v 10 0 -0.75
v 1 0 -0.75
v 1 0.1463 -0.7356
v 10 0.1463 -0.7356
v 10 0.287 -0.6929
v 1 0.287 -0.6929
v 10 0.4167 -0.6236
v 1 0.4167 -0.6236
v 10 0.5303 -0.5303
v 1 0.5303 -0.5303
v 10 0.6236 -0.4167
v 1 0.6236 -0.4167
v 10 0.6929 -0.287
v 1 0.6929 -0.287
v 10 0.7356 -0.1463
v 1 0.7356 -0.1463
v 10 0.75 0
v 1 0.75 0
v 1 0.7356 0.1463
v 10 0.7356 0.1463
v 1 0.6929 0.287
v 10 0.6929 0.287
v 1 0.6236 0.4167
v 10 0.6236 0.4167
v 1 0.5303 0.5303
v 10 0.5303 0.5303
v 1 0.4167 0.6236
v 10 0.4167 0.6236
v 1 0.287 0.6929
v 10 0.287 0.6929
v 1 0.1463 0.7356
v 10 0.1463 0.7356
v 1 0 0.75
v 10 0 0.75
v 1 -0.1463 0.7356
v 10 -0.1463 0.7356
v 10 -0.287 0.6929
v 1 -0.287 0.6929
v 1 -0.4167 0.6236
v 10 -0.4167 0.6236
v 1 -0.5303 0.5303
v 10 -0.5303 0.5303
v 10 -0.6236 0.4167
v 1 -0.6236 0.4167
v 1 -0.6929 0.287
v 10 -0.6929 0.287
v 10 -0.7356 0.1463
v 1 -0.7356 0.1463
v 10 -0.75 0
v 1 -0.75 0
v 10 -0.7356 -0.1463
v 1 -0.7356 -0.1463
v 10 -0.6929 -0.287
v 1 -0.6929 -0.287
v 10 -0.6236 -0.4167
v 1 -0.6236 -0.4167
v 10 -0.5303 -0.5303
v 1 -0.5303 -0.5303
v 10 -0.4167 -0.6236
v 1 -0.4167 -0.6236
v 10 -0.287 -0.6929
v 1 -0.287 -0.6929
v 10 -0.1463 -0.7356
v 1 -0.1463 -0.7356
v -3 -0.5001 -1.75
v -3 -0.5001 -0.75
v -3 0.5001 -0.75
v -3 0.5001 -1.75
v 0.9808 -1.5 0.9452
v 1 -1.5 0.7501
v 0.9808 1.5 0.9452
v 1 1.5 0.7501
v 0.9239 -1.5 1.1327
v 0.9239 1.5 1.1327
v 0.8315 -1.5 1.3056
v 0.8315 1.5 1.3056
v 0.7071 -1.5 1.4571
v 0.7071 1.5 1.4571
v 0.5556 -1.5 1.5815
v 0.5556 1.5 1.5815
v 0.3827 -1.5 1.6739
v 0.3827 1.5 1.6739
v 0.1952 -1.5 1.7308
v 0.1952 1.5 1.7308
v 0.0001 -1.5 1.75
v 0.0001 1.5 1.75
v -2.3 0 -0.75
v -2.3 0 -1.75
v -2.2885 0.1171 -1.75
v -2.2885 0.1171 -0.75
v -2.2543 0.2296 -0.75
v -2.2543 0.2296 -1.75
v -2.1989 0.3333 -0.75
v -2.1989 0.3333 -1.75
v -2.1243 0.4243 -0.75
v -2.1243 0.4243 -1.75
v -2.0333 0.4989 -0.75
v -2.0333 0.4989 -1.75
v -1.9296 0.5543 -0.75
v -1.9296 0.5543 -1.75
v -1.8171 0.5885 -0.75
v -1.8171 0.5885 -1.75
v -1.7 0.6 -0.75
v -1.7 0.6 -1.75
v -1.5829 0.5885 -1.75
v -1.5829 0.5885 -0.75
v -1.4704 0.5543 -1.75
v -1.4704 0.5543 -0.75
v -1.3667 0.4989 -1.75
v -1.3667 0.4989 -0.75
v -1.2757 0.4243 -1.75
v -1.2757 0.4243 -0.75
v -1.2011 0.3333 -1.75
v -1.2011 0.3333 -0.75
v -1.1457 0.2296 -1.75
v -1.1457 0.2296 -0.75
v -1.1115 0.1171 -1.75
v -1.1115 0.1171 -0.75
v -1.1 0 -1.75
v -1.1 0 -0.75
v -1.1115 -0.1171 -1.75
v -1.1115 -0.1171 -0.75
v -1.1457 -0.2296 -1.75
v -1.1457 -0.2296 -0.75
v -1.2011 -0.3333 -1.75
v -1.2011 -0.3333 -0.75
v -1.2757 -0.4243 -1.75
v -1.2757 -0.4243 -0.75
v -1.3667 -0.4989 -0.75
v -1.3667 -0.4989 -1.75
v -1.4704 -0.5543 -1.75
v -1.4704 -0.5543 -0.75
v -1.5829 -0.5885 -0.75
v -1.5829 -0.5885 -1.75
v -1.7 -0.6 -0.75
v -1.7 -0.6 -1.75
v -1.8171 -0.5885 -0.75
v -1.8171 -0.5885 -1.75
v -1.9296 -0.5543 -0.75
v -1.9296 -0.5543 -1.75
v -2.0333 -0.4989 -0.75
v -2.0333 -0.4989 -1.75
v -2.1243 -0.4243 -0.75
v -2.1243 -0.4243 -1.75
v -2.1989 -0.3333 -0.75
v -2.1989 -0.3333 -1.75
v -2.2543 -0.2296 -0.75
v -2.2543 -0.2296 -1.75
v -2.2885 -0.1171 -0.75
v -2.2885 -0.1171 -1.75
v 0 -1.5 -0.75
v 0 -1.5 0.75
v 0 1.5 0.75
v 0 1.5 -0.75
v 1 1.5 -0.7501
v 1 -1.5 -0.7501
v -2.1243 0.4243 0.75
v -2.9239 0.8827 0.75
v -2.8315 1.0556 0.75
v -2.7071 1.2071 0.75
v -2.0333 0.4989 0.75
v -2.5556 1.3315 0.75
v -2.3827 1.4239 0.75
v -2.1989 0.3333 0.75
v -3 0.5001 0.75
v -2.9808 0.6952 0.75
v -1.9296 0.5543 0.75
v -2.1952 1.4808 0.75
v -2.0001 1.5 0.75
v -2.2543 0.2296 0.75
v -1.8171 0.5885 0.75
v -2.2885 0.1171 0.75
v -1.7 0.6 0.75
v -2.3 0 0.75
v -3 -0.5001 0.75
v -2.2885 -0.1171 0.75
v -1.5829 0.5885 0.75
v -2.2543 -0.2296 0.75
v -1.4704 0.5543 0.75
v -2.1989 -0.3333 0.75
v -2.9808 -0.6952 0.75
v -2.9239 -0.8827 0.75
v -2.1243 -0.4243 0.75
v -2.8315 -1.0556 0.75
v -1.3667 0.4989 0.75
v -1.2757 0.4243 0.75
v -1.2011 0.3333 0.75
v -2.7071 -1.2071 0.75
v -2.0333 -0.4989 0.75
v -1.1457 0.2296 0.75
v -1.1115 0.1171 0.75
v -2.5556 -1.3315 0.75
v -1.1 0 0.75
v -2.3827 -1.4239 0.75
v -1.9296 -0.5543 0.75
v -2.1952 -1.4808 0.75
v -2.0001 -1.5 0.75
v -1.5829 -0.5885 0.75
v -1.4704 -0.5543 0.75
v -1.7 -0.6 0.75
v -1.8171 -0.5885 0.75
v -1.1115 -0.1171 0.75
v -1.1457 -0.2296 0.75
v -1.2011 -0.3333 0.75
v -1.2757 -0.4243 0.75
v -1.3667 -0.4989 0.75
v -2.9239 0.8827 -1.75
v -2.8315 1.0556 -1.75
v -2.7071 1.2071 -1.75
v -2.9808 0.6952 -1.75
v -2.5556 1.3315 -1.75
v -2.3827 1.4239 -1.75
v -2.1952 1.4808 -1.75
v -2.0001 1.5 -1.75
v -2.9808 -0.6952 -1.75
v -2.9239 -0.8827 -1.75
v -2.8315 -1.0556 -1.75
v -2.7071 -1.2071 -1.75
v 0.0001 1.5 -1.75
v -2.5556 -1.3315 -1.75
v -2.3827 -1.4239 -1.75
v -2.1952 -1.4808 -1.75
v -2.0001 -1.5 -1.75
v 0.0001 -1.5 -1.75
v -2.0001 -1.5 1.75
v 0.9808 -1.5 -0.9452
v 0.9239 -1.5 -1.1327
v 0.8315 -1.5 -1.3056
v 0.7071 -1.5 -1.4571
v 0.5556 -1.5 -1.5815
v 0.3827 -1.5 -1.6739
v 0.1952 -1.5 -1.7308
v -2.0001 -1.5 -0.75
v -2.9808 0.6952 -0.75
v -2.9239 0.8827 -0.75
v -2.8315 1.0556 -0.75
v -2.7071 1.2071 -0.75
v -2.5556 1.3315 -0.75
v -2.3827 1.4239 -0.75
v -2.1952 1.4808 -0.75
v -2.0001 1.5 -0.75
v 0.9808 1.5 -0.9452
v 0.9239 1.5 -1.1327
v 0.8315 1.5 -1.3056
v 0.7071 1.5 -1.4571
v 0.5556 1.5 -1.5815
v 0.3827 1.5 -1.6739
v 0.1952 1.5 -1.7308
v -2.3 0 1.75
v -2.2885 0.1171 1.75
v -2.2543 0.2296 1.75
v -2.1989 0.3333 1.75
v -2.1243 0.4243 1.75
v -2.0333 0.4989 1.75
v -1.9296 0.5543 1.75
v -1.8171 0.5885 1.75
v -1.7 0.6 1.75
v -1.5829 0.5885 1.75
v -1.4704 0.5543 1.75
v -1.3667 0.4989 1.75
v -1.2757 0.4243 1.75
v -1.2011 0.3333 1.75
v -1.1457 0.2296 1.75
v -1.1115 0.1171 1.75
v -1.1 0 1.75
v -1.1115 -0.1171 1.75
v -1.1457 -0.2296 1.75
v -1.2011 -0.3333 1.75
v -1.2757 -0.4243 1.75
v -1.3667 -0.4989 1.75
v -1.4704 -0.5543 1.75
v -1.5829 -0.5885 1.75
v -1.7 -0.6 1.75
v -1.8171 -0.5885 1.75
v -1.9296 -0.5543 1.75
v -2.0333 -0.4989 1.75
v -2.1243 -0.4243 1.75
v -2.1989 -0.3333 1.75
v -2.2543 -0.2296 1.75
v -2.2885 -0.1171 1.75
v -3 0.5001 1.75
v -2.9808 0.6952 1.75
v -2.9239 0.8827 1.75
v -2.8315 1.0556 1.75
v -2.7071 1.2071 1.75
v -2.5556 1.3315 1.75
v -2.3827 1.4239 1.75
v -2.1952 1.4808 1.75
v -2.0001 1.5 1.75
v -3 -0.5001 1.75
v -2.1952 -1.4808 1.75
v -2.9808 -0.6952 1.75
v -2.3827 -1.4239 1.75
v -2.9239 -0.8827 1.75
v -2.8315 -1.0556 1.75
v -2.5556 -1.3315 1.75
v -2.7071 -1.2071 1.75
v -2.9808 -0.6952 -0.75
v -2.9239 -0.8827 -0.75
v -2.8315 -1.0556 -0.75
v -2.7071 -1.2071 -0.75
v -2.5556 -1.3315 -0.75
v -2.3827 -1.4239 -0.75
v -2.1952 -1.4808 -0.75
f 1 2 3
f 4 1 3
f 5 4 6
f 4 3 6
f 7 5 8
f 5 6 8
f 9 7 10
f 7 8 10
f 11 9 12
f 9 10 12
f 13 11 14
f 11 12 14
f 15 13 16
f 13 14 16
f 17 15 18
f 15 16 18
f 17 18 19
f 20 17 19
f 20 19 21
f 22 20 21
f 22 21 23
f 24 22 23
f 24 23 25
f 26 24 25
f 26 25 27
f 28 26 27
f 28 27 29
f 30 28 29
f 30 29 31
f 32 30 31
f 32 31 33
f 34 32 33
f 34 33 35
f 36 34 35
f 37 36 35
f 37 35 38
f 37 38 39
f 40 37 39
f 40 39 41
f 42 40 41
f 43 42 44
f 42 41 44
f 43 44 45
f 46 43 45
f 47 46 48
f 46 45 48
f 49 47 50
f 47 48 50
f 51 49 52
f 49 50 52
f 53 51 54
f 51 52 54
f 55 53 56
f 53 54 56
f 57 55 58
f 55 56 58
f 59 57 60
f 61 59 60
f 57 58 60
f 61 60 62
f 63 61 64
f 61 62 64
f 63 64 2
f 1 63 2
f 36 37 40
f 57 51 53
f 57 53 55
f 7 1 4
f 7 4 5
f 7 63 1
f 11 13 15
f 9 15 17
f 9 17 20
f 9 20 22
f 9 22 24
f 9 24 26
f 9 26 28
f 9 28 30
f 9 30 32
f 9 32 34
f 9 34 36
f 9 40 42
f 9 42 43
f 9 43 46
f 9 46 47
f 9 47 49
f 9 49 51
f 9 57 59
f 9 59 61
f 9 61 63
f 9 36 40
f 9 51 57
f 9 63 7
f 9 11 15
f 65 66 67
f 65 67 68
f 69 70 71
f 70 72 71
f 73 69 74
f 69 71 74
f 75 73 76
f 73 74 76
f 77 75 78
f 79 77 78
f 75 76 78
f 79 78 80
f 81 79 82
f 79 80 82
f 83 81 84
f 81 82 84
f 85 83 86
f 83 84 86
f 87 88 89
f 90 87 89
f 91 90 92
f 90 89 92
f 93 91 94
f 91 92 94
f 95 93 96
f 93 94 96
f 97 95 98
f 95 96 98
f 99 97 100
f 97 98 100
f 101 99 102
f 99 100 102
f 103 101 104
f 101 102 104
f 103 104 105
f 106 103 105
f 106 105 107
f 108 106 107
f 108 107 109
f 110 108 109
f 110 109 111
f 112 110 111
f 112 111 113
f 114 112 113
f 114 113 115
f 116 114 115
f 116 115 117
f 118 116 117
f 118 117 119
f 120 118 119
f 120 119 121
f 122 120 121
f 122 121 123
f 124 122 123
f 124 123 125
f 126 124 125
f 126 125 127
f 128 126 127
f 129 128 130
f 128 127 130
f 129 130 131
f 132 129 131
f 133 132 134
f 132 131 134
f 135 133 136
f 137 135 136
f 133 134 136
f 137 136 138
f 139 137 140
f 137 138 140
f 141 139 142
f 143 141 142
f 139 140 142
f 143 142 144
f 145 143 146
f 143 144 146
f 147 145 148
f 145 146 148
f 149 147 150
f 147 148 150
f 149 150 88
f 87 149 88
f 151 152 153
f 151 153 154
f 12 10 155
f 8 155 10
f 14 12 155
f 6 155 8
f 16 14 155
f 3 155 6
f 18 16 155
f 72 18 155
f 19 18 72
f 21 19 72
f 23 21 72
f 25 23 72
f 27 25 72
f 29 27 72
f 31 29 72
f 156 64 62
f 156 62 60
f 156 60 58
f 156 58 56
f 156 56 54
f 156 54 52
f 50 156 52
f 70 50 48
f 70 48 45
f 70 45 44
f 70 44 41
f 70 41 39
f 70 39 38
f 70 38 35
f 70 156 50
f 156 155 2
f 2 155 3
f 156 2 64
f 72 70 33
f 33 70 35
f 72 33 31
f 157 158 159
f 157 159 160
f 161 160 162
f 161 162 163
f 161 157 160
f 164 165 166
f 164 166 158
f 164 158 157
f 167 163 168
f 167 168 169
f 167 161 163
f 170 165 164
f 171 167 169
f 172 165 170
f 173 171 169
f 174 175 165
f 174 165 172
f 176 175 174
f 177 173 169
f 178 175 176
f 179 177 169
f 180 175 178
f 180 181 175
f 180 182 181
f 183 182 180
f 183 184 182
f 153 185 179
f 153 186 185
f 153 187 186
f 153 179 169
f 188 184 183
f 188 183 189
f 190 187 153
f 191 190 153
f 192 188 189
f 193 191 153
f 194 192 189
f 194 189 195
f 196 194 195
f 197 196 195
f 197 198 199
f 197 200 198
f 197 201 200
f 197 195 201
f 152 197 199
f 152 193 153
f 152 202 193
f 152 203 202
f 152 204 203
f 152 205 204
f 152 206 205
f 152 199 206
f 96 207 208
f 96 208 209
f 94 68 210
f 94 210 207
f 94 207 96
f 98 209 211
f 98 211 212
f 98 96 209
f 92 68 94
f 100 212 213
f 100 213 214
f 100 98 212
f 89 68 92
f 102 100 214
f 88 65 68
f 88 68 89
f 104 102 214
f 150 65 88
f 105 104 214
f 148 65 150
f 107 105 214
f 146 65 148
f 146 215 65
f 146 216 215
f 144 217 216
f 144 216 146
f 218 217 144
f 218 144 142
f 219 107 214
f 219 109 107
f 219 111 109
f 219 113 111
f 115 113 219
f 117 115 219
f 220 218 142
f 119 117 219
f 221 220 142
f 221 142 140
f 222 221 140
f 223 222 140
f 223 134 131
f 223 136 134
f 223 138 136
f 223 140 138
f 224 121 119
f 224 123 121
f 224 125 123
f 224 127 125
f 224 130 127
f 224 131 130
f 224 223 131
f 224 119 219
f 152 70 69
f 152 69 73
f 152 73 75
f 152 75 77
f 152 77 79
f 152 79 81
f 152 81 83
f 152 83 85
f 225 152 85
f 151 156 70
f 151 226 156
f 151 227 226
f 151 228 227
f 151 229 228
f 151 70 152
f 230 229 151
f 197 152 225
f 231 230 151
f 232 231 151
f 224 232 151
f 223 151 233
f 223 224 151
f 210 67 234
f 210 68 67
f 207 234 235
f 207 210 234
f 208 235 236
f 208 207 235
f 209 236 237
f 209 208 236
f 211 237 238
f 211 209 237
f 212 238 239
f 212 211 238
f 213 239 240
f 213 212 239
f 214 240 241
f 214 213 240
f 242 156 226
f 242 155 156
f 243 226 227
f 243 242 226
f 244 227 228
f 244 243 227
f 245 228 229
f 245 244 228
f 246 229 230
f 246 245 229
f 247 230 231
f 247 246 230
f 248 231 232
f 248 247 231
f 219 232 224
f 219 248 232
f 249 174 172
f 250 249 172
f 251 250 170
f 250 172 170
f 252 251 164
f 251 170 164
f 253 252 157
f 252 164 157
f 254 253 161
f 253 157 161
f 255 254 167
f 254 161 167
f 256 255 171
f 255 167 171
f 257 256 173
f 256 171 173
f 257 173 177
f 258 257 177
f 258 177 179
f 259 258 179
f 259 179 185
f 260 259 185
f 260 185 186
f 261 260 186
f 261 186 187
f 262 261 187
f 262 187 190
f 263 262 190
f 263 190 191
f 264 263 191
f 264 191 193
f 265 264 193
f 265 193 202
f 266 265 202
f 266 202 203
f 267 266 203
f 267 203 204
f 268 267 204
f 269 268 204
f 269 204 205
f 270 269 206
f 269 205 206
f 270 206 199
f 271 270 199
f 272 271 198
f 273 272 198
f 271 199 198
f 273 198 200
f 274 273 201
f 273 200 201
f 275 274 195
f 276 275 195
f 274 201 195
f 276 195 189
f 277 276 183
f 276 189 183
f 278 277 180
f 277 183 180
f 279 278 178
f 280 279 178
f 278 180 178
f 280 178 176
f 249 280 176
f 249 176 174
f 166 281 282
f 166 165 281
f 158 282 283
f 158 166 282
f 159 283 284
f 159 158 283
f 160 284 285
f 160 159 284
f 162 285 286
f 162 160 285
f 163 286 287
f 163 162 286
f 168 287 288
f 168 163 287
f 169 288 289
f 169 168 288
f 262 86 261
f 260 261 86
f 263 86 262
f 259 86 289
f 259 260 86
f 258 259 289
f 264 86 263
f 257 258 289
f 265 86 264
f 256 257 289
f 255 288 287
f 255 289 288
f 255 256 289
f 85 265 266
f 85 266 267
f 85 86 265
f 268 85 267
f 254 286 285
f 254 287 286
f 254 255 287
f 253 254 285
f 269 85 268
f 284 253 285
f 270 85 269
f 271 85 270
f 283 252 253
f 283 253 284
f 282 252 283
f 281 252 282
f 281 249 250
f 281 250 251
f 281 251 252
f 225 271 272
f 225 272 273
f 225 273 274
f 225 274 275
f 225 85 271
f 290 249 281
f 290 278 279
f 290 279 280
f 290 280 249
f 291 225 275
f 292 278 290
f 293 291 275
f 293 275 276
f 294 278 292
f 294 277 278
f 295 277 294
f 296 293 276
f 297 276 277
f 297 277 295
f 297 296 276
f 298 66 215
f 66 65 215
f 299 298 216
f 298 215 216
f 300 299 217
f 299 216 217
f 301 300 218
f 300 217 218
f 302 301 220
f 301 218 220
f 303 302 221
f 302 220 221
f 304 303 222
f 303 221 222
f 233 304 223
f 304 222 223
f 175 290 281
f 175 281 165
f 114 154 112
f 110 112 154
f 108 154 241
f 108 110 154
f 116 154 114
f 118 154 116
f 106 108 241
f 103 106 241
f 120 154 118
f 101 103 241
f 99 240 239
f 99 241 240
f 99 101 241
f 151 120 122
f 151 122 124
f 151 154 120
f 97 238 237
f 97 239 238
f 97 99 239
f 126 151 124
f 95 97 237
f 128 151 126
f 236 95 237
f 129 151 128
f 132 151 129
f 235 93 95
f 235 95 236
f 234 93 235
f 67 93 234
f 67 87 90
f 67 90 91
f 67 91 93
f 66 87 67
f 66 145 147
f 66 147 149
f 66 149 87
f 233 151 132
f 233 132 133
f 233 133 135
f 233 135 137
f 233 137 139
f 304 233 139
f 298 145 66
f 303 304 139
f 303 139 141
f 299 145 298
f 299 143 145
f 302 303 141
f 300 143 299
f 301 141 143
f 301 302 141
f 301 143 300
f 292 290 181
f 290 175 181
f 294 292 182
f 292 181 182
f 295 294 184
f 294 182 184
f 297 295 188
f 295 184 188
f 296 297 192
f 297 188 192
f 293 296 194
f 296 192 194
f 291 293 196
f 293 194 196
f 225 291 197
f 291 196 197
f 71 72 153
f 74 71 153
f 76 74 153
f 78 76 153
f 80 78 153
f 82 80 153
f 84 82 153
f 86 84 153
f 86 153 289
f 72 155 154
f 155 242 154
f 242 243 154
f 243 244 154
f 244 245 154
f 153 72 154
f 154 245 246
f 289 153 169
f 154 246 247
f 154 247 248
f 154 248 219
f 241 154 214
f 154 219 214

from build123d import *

# Parameters (mm, degrees)
SKETCH1_R                = 0.75
BOSS_EXTRUDE1_DEPTH      = 10
BOSS_EXTRUDE2_DEPTH      = 1.5
BOSS_EXTRUDE2_DEPTH_BACK = 1.5
FILLET1_R                = 1
SKETCH3_R                = 0.6
CUT_EXTRUDE1_DEPTH       = 5


with BuildPart() as part:
    # Sketch1 → Boss-Extrude1 (new body)
    with BuildSketch(Plane(origin=(0, 0, 0), x_dir=(0, 0, -1), z_dir=(1, 0, 0))):
        Circle(SKETCH1_R)
    extrude(amount=BOSS_EXTRUDE1_DEPTH)

    # Sketch2 → Boss-Extrude2 (add, two sides: drawn at the far end of the back side and taken through both)
    with BuildSketch(Plane(origin=(0, 0, 0), x_dir=(1, 0, 0), z_dir=(0, 1, 0)).offset(-BOSS_EXTRUDE2_DEPTH_BACK)):
        Polygon((1, 1.75), (1, -1.75), (-3, -1.75), (-3, -0.75), (0, -0.75), (0, 0.75), (-3, 0.75), (-3, 1.75), align=None)
    extrude(amount=BOSS_EXTRUDE2_DEPTH + BOSS_EXTRUDE2_DEPTH_BACK)

    # Fillet1
    fillet1_edges = [part.edges().sort_by_distance(p)[0] for p in [
        (-3, 1.5, 1.25),
        (-3, 1.5, -1.25),
        (-3, -1.5, -1.25),
        (1, 0, -1.75),
        (1, 0, 1.75),
        (-3, -1.5, 1.25),
    ]]
    fillet(fillet1_edges, radius=FILLET1_R - 0.0001)  # a hair under: the kernel refuses the full size

    # Sketch3 → Cut-Extrude1 (cut)
    with BuildSketch(Plane(origin=(0, 0, -1.75), x_dir=(-1, 0, 0), z_dir=(0, 0, -1))):
        with Locations((1.7, 0)):
            Circle(SKETCH3_R)
    extrude(amount=-CUT_EXTRUDE1_DEPTH, mode=Mode.SUBTRACT)


solid = part.part
